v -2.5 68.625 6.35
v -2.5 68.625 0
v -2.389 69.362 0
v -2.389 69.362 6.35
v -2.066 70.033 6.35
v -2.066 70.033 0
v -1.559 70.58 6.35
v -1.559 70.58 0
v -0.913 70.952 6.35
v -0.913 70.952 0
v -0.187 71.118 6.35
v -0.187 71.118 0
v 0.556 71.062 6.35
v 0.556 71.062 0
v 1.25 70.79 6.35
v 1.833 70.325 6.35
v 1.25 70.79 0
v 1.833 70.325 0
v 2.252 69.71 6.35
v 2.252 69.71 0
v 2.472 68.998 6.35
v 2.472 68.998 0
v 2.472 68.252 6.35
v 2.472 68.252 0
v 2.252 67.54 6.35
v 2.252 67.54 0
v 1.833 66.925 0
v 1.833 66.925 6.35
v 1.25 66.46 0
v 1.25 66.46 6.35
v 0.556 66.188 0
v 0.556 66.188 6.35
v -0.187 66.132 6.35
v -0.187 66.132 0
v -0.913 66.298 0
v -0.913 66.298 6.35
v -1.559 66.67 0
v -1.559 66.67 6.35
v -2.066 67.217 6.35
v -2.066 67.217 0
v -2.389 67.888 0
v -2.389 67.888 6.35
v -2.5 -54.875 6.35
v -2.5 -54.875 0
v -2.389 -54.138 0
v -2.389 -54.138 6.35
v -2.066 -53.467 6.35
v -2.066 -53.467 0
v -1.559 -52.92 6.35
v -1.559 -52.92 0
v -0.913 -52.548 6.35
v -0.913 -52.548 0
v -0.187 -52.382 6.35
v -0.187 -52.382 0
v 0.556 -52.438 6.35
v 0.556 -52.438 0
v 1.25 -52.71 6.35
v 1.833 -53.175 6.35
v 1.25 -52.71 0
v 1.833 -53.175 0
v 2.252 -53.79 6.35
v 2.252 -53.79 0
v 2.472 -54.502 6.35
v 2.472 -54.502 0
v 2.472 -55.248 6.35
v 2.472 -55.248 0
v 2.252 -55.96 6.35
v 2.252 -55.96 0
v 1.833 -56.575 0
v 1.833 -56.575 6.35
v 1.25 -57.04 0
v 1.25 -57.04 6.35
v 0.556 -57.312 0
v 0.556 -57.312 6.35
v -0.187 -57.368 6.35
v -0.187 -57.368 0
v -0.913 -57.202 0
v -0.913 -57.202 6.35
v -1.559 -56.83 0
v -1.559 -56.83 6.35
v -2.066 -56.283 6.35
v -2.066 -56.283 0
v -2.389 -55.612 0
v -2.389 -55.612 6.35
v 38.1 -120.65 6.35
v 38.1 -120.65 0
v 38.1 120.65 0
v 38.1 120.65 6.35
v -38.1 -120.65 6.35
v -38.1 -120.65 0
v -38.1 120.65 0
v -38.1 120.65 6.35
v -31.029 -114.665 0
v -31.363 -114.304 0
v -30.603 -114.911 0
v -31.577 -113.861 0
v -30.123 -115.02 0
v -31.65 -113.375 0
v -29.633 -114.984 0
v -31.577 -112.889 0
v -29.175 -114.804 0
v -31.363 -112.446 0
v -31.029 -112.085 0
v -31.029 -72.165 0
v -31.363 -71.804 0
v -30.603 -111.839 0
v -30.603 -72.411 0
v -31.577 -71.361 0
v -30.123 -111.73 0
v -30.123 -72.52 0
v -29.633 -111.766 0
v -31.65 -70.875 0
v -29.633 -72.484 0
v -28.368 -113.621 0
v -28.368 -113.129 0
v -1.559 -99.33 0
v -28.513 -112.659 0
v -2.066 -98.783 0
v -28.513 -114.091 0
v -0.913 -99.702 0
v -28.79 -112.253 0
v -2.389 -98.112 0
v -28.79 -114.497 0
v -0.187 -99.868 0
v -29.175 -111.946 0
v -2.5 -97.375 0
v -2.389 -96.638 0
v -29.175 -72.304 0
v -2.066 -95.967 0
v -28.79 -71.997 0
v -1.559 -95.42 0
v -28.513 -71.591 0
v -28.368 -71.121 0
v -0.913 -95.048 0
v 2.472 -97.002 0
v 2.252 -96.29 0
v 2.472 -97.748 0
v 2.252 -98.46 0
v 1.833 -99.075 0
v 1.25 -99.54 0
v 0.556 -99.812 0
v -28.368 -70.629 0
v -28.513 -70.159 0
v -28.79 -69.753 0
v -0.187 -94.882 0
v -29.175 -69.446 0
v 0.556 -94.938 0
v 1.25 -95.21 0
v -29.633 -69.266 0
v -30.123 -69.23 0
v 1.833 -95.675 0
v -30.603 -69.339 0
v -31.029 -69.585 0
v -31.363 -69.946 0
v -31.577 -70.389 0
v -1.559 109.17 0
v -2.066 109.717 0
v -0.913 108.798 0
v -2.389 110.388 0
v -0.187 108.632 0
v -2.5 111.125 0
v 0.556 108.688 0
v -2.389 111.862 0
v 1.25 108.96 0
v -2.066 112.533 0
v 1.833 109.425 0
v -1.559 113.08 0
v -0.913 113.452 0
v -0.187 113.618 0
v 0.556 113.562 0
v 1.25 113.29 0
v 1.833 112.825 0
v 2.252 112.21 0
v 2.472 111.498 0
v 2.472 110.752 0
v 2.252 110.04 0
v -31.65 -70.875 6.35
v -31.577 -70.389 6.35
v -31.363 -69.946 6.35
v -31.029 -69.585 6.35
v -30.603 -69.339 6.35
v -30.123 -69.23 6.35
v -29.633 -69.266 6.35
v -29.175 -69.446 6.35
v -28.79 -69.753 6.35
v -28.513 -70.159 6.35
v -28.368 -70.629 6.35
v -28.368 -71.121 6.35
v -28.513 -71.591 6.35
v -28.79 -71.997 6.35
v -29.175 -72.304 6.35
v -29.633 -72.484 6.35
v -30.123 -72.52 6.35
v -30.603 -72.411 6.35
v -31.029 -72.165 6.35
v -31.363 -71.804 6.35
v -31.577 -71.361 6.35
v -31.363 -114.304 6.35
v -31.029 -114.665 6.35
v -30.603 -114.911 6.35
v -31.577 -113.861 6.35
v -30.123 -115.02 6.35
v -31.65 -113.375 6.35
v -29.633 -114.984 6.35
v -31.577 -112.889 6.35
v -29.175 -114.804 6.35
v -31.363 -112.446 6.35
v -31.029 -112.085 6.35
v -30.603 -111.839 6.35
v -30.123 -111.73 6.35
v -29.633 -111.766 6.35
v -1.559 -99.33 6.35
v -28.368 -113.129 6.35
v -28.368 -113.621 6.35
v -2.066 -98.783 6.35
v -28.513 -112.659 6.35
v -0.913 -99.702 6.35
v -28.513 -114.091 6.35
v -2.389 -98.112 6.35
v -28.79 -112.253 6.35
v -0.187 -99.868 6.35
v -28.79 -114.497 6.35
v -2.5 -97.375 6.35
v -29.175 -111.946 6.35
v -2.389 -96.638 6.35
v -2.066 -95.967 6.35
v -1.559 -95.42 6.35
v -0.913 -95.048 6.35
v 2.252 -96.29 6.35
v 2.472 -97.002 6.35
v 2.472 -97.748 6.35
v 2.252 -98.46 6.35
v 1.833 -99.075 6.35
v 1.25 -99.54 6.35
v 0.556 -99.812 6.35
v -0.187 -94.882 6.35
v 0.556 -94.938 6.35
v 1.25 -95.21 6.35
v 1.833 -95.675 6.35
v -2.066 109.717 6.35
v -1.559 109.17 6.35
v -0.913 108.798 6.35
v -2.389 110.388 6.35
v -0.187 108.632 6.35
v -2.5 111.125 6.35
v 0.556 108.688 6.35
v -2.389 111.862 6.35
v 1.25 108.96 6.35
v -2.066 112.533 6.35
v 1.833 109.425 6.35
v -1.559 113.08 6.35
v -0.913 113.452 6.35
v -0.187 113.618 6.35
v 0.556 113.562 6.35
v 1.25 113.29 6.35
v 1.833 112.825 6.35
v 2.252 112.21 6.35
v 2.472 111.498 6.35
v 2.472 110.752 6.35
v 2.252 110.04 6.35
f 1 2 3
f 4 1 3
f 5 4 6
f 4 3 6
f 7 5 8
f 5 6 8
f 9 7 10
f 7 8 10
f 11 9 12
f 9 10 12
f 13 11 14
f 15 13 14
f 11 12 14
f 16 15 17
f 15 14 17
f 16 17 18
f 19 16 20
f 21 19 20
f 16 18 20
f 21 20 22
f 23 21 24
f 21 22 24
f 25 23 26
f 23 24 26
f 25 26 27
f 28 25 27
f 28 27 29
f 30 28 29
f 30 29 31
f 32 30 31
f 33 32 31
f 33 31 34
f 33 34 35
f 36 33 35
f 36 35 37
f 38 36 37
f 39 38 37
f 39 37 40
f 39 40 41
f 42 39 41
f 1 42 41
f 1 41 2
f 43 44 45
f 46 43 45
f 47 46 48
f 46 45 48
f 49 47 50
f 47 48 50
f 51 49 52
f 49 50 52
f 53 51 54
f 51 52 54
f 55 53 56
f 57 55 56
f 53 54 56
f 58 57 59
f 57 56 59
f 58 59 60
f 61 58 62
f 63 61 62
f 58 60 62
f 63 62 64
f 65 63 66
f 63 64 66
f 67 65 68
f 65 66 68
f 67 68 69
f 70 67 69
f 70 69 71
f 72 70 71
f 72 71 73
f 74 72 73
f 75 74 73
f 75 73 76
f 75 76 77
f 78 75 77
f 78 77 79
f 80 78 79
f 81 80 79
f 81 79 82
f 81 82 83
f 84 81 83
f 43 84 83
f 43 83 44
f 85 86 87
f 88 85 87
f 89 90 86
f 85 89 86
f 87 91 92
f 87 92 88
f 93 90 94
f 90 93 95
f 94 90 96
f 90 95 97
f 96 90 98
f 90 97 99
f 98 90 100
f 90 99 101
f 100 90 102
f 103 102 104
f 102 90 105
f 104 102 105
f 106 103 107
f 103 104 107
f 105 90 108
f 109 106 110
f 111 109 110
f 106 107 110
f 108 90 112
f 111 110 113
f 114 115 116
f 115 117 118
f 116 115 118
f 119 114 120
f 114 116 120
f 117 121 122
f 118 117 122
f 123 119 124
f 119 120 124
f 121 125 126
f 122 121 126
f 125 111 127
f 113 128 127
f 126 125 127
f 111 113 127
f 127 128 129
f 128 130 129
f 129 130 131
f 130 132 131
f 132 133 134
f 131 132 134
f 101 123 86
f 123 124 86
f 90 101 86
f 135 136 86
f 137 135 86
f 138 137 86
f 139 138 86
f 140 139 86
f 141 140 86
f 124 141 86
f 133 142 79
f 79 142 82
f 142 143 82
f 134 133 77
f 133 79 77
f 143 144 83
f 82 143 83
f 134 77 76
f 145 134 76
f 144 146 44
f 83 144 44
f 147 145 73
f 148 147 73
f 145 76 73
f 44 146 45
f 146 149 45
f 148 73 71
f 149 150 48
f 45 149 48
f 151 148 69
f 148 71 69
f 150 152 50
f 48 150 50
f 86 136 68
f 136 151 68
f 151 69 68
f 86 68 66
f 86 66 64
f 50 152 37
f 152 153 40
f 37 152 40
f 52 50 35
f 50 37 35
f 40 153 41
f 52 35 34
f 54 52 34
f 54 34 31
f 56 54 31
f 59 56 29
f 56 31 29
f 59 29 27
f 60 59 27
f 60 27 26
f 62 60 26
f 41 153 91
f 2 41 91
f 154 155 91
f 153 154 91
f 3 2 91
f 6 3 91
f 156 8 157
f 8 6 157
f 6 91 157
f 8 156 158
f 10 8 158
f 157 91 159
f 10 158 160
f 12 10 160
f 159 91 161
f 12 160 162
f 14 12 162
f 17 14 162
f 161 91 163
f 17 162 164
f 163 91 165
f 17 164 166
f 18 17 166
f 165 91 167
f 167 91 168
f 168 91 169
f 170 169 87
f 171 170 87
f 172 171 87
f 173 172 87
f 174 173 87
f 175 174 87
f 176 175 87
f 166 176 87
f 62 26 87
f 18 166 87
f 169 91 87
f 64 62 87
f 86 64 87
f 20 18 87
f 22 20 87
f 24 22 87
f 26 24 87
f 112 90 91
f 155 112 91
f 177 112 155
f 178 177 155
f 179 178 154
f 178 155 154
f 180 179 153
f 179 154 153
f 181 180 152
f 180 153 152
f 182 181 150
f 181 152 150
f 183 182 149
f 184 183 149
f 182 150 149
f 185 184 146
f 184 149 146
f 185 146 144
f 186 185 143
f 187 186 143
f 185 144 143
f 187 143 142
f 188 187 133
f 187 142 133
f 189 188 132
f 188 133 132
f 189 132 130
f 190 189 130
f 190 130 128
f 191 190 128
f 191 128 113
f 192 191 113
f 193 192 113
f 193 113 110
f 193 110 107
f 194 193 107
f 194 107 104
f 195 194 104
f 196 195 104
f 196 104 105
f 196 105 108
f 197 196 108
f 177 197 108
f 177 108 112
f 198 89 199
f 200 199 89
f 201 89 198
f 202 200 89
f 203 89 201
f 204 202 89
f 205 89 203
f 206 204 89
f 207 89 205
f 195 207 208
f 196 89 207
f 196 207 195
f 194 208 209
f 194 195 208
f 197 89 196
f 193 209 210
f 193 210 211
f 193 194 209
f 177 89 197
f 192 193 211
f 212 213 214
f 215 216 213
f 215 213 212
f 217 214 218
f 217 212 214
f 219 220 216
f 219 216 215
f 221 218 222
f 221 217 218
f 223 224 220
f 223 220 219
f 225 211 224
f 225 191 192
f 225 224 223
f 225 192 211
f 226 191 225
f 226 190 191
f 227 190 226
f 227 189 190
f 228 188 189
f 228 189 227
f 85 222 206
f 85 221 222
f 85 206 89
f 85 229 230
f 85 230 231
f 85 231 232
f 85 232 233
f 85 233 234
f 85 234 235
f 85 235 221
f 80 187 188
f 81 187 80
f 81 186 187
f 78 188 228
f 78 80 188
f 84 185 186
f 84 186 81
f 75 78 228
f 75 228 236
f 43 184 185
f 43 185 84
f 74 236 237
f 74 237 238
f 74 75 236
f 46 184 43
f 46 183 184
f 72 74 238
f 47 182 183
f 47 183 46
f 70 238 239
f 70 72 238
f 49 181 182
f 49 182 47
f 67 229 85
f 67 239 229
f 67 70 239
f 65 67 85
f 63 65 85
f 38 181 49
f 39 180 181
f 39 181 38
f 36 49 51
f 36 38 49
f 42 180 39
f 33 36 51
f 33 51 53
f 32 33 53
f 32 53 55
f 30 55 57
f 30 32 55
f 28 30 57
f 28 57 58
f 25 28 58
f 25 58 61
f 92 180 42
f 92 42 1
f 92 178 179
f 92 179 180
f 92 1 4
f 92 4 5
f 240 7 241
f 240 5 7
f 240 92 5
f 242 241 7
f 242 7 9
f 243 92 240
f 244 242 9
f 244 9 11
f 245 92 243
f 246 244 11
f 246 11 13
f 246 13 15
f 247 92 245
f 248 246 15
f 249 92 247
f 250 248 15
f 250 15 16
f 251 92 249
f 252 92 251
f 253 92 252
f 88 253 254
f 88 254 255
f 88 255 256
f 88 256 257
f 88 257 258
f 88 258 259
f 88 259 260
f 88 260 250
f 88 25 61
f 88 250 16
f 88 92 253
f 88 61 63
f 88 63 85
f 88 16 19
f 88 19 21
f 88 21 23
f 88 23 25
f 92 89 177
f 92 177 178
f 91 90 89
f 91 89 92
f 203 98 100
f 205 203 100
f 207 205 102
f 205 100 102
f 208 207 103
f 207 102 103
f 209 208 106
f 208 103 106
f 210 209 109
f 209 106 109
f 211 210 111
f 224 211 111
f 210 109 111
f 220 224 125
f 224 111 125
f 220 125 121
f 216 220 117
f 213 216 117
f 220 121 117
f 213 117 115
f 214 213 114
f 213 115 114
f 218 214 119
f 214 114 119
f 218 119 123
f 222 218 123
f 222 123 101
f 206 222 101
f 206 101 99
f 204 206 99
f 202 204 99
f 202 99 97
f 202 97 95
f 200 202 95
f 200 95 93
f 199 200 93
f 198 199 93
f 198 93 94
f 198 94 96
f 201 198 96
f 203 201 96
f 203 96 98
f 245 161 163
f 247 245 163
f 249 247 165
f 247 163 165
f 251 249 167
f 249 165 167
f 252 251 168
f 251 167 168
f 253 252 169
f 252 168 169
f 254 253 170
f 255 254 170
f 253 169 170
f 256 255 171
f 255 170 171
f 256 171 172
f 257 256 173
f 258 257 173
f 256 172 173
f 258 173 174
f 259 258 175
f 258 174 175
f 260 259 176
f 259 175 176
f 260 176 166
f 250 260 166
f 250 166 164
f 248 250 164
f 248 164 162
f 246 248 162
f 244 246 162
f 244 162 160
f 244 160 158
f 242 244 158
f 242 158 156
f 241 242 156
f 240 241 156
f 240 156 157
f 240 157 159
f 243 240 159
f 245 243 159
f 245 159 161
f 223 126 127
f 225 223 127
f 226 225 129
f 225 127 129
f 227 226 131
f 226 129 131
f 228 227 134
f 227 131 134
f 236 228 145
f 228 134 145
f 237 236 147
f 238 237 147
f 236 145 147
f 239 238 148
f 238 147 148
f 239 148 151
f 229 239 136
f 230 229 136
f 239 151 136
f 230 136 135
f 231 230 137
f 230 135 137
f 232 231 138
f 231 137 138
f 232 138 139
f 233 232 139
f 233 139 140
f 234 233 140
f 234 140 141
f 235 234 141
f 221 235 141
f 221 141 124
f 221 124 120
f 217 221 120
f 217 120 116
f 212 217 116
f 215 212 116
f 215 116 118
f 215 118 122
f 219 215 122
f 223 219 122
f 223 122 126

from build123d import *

# Parameters (mm, degrees)
SKETCH1_W           = 76.2
SKETCH1_H           = 241.3
BOSS_EXTRUDE1_DEPTH = 6.35
M6_TAPPED_HOLE1_D   = 5
M4_TAPPED_HOLE1_D   = 3.3


with BuildPart() as part:
    # Sketch1 → Boss-Extrude1 (new body)
    with BuildSketch(Plane.XY):
        Rectangle(SKETCH1_W, SKETCH1_H)
    extrude(amount=BOSS_EXTRUDE1_DEPTH)

    # M6 Tapped Hole1 (through all)
    with Locations(Plane.XY.offset(6.35)):
        with Locations((0, -97.375), (0, 111.125), (0, -54.875), (0, 68.625)):
            Hole(M6_TAPPED_HOLE1_D / 2)

    # M4 Tapped Hole1 (through all)
    with Locations(Plane.XY.offset(6.35)):
        with Locations((-30, -70.875), (-30, -113.375)):
            Hole(M4_TAPPED_HOLE1_D / 2)


solid = part.part
